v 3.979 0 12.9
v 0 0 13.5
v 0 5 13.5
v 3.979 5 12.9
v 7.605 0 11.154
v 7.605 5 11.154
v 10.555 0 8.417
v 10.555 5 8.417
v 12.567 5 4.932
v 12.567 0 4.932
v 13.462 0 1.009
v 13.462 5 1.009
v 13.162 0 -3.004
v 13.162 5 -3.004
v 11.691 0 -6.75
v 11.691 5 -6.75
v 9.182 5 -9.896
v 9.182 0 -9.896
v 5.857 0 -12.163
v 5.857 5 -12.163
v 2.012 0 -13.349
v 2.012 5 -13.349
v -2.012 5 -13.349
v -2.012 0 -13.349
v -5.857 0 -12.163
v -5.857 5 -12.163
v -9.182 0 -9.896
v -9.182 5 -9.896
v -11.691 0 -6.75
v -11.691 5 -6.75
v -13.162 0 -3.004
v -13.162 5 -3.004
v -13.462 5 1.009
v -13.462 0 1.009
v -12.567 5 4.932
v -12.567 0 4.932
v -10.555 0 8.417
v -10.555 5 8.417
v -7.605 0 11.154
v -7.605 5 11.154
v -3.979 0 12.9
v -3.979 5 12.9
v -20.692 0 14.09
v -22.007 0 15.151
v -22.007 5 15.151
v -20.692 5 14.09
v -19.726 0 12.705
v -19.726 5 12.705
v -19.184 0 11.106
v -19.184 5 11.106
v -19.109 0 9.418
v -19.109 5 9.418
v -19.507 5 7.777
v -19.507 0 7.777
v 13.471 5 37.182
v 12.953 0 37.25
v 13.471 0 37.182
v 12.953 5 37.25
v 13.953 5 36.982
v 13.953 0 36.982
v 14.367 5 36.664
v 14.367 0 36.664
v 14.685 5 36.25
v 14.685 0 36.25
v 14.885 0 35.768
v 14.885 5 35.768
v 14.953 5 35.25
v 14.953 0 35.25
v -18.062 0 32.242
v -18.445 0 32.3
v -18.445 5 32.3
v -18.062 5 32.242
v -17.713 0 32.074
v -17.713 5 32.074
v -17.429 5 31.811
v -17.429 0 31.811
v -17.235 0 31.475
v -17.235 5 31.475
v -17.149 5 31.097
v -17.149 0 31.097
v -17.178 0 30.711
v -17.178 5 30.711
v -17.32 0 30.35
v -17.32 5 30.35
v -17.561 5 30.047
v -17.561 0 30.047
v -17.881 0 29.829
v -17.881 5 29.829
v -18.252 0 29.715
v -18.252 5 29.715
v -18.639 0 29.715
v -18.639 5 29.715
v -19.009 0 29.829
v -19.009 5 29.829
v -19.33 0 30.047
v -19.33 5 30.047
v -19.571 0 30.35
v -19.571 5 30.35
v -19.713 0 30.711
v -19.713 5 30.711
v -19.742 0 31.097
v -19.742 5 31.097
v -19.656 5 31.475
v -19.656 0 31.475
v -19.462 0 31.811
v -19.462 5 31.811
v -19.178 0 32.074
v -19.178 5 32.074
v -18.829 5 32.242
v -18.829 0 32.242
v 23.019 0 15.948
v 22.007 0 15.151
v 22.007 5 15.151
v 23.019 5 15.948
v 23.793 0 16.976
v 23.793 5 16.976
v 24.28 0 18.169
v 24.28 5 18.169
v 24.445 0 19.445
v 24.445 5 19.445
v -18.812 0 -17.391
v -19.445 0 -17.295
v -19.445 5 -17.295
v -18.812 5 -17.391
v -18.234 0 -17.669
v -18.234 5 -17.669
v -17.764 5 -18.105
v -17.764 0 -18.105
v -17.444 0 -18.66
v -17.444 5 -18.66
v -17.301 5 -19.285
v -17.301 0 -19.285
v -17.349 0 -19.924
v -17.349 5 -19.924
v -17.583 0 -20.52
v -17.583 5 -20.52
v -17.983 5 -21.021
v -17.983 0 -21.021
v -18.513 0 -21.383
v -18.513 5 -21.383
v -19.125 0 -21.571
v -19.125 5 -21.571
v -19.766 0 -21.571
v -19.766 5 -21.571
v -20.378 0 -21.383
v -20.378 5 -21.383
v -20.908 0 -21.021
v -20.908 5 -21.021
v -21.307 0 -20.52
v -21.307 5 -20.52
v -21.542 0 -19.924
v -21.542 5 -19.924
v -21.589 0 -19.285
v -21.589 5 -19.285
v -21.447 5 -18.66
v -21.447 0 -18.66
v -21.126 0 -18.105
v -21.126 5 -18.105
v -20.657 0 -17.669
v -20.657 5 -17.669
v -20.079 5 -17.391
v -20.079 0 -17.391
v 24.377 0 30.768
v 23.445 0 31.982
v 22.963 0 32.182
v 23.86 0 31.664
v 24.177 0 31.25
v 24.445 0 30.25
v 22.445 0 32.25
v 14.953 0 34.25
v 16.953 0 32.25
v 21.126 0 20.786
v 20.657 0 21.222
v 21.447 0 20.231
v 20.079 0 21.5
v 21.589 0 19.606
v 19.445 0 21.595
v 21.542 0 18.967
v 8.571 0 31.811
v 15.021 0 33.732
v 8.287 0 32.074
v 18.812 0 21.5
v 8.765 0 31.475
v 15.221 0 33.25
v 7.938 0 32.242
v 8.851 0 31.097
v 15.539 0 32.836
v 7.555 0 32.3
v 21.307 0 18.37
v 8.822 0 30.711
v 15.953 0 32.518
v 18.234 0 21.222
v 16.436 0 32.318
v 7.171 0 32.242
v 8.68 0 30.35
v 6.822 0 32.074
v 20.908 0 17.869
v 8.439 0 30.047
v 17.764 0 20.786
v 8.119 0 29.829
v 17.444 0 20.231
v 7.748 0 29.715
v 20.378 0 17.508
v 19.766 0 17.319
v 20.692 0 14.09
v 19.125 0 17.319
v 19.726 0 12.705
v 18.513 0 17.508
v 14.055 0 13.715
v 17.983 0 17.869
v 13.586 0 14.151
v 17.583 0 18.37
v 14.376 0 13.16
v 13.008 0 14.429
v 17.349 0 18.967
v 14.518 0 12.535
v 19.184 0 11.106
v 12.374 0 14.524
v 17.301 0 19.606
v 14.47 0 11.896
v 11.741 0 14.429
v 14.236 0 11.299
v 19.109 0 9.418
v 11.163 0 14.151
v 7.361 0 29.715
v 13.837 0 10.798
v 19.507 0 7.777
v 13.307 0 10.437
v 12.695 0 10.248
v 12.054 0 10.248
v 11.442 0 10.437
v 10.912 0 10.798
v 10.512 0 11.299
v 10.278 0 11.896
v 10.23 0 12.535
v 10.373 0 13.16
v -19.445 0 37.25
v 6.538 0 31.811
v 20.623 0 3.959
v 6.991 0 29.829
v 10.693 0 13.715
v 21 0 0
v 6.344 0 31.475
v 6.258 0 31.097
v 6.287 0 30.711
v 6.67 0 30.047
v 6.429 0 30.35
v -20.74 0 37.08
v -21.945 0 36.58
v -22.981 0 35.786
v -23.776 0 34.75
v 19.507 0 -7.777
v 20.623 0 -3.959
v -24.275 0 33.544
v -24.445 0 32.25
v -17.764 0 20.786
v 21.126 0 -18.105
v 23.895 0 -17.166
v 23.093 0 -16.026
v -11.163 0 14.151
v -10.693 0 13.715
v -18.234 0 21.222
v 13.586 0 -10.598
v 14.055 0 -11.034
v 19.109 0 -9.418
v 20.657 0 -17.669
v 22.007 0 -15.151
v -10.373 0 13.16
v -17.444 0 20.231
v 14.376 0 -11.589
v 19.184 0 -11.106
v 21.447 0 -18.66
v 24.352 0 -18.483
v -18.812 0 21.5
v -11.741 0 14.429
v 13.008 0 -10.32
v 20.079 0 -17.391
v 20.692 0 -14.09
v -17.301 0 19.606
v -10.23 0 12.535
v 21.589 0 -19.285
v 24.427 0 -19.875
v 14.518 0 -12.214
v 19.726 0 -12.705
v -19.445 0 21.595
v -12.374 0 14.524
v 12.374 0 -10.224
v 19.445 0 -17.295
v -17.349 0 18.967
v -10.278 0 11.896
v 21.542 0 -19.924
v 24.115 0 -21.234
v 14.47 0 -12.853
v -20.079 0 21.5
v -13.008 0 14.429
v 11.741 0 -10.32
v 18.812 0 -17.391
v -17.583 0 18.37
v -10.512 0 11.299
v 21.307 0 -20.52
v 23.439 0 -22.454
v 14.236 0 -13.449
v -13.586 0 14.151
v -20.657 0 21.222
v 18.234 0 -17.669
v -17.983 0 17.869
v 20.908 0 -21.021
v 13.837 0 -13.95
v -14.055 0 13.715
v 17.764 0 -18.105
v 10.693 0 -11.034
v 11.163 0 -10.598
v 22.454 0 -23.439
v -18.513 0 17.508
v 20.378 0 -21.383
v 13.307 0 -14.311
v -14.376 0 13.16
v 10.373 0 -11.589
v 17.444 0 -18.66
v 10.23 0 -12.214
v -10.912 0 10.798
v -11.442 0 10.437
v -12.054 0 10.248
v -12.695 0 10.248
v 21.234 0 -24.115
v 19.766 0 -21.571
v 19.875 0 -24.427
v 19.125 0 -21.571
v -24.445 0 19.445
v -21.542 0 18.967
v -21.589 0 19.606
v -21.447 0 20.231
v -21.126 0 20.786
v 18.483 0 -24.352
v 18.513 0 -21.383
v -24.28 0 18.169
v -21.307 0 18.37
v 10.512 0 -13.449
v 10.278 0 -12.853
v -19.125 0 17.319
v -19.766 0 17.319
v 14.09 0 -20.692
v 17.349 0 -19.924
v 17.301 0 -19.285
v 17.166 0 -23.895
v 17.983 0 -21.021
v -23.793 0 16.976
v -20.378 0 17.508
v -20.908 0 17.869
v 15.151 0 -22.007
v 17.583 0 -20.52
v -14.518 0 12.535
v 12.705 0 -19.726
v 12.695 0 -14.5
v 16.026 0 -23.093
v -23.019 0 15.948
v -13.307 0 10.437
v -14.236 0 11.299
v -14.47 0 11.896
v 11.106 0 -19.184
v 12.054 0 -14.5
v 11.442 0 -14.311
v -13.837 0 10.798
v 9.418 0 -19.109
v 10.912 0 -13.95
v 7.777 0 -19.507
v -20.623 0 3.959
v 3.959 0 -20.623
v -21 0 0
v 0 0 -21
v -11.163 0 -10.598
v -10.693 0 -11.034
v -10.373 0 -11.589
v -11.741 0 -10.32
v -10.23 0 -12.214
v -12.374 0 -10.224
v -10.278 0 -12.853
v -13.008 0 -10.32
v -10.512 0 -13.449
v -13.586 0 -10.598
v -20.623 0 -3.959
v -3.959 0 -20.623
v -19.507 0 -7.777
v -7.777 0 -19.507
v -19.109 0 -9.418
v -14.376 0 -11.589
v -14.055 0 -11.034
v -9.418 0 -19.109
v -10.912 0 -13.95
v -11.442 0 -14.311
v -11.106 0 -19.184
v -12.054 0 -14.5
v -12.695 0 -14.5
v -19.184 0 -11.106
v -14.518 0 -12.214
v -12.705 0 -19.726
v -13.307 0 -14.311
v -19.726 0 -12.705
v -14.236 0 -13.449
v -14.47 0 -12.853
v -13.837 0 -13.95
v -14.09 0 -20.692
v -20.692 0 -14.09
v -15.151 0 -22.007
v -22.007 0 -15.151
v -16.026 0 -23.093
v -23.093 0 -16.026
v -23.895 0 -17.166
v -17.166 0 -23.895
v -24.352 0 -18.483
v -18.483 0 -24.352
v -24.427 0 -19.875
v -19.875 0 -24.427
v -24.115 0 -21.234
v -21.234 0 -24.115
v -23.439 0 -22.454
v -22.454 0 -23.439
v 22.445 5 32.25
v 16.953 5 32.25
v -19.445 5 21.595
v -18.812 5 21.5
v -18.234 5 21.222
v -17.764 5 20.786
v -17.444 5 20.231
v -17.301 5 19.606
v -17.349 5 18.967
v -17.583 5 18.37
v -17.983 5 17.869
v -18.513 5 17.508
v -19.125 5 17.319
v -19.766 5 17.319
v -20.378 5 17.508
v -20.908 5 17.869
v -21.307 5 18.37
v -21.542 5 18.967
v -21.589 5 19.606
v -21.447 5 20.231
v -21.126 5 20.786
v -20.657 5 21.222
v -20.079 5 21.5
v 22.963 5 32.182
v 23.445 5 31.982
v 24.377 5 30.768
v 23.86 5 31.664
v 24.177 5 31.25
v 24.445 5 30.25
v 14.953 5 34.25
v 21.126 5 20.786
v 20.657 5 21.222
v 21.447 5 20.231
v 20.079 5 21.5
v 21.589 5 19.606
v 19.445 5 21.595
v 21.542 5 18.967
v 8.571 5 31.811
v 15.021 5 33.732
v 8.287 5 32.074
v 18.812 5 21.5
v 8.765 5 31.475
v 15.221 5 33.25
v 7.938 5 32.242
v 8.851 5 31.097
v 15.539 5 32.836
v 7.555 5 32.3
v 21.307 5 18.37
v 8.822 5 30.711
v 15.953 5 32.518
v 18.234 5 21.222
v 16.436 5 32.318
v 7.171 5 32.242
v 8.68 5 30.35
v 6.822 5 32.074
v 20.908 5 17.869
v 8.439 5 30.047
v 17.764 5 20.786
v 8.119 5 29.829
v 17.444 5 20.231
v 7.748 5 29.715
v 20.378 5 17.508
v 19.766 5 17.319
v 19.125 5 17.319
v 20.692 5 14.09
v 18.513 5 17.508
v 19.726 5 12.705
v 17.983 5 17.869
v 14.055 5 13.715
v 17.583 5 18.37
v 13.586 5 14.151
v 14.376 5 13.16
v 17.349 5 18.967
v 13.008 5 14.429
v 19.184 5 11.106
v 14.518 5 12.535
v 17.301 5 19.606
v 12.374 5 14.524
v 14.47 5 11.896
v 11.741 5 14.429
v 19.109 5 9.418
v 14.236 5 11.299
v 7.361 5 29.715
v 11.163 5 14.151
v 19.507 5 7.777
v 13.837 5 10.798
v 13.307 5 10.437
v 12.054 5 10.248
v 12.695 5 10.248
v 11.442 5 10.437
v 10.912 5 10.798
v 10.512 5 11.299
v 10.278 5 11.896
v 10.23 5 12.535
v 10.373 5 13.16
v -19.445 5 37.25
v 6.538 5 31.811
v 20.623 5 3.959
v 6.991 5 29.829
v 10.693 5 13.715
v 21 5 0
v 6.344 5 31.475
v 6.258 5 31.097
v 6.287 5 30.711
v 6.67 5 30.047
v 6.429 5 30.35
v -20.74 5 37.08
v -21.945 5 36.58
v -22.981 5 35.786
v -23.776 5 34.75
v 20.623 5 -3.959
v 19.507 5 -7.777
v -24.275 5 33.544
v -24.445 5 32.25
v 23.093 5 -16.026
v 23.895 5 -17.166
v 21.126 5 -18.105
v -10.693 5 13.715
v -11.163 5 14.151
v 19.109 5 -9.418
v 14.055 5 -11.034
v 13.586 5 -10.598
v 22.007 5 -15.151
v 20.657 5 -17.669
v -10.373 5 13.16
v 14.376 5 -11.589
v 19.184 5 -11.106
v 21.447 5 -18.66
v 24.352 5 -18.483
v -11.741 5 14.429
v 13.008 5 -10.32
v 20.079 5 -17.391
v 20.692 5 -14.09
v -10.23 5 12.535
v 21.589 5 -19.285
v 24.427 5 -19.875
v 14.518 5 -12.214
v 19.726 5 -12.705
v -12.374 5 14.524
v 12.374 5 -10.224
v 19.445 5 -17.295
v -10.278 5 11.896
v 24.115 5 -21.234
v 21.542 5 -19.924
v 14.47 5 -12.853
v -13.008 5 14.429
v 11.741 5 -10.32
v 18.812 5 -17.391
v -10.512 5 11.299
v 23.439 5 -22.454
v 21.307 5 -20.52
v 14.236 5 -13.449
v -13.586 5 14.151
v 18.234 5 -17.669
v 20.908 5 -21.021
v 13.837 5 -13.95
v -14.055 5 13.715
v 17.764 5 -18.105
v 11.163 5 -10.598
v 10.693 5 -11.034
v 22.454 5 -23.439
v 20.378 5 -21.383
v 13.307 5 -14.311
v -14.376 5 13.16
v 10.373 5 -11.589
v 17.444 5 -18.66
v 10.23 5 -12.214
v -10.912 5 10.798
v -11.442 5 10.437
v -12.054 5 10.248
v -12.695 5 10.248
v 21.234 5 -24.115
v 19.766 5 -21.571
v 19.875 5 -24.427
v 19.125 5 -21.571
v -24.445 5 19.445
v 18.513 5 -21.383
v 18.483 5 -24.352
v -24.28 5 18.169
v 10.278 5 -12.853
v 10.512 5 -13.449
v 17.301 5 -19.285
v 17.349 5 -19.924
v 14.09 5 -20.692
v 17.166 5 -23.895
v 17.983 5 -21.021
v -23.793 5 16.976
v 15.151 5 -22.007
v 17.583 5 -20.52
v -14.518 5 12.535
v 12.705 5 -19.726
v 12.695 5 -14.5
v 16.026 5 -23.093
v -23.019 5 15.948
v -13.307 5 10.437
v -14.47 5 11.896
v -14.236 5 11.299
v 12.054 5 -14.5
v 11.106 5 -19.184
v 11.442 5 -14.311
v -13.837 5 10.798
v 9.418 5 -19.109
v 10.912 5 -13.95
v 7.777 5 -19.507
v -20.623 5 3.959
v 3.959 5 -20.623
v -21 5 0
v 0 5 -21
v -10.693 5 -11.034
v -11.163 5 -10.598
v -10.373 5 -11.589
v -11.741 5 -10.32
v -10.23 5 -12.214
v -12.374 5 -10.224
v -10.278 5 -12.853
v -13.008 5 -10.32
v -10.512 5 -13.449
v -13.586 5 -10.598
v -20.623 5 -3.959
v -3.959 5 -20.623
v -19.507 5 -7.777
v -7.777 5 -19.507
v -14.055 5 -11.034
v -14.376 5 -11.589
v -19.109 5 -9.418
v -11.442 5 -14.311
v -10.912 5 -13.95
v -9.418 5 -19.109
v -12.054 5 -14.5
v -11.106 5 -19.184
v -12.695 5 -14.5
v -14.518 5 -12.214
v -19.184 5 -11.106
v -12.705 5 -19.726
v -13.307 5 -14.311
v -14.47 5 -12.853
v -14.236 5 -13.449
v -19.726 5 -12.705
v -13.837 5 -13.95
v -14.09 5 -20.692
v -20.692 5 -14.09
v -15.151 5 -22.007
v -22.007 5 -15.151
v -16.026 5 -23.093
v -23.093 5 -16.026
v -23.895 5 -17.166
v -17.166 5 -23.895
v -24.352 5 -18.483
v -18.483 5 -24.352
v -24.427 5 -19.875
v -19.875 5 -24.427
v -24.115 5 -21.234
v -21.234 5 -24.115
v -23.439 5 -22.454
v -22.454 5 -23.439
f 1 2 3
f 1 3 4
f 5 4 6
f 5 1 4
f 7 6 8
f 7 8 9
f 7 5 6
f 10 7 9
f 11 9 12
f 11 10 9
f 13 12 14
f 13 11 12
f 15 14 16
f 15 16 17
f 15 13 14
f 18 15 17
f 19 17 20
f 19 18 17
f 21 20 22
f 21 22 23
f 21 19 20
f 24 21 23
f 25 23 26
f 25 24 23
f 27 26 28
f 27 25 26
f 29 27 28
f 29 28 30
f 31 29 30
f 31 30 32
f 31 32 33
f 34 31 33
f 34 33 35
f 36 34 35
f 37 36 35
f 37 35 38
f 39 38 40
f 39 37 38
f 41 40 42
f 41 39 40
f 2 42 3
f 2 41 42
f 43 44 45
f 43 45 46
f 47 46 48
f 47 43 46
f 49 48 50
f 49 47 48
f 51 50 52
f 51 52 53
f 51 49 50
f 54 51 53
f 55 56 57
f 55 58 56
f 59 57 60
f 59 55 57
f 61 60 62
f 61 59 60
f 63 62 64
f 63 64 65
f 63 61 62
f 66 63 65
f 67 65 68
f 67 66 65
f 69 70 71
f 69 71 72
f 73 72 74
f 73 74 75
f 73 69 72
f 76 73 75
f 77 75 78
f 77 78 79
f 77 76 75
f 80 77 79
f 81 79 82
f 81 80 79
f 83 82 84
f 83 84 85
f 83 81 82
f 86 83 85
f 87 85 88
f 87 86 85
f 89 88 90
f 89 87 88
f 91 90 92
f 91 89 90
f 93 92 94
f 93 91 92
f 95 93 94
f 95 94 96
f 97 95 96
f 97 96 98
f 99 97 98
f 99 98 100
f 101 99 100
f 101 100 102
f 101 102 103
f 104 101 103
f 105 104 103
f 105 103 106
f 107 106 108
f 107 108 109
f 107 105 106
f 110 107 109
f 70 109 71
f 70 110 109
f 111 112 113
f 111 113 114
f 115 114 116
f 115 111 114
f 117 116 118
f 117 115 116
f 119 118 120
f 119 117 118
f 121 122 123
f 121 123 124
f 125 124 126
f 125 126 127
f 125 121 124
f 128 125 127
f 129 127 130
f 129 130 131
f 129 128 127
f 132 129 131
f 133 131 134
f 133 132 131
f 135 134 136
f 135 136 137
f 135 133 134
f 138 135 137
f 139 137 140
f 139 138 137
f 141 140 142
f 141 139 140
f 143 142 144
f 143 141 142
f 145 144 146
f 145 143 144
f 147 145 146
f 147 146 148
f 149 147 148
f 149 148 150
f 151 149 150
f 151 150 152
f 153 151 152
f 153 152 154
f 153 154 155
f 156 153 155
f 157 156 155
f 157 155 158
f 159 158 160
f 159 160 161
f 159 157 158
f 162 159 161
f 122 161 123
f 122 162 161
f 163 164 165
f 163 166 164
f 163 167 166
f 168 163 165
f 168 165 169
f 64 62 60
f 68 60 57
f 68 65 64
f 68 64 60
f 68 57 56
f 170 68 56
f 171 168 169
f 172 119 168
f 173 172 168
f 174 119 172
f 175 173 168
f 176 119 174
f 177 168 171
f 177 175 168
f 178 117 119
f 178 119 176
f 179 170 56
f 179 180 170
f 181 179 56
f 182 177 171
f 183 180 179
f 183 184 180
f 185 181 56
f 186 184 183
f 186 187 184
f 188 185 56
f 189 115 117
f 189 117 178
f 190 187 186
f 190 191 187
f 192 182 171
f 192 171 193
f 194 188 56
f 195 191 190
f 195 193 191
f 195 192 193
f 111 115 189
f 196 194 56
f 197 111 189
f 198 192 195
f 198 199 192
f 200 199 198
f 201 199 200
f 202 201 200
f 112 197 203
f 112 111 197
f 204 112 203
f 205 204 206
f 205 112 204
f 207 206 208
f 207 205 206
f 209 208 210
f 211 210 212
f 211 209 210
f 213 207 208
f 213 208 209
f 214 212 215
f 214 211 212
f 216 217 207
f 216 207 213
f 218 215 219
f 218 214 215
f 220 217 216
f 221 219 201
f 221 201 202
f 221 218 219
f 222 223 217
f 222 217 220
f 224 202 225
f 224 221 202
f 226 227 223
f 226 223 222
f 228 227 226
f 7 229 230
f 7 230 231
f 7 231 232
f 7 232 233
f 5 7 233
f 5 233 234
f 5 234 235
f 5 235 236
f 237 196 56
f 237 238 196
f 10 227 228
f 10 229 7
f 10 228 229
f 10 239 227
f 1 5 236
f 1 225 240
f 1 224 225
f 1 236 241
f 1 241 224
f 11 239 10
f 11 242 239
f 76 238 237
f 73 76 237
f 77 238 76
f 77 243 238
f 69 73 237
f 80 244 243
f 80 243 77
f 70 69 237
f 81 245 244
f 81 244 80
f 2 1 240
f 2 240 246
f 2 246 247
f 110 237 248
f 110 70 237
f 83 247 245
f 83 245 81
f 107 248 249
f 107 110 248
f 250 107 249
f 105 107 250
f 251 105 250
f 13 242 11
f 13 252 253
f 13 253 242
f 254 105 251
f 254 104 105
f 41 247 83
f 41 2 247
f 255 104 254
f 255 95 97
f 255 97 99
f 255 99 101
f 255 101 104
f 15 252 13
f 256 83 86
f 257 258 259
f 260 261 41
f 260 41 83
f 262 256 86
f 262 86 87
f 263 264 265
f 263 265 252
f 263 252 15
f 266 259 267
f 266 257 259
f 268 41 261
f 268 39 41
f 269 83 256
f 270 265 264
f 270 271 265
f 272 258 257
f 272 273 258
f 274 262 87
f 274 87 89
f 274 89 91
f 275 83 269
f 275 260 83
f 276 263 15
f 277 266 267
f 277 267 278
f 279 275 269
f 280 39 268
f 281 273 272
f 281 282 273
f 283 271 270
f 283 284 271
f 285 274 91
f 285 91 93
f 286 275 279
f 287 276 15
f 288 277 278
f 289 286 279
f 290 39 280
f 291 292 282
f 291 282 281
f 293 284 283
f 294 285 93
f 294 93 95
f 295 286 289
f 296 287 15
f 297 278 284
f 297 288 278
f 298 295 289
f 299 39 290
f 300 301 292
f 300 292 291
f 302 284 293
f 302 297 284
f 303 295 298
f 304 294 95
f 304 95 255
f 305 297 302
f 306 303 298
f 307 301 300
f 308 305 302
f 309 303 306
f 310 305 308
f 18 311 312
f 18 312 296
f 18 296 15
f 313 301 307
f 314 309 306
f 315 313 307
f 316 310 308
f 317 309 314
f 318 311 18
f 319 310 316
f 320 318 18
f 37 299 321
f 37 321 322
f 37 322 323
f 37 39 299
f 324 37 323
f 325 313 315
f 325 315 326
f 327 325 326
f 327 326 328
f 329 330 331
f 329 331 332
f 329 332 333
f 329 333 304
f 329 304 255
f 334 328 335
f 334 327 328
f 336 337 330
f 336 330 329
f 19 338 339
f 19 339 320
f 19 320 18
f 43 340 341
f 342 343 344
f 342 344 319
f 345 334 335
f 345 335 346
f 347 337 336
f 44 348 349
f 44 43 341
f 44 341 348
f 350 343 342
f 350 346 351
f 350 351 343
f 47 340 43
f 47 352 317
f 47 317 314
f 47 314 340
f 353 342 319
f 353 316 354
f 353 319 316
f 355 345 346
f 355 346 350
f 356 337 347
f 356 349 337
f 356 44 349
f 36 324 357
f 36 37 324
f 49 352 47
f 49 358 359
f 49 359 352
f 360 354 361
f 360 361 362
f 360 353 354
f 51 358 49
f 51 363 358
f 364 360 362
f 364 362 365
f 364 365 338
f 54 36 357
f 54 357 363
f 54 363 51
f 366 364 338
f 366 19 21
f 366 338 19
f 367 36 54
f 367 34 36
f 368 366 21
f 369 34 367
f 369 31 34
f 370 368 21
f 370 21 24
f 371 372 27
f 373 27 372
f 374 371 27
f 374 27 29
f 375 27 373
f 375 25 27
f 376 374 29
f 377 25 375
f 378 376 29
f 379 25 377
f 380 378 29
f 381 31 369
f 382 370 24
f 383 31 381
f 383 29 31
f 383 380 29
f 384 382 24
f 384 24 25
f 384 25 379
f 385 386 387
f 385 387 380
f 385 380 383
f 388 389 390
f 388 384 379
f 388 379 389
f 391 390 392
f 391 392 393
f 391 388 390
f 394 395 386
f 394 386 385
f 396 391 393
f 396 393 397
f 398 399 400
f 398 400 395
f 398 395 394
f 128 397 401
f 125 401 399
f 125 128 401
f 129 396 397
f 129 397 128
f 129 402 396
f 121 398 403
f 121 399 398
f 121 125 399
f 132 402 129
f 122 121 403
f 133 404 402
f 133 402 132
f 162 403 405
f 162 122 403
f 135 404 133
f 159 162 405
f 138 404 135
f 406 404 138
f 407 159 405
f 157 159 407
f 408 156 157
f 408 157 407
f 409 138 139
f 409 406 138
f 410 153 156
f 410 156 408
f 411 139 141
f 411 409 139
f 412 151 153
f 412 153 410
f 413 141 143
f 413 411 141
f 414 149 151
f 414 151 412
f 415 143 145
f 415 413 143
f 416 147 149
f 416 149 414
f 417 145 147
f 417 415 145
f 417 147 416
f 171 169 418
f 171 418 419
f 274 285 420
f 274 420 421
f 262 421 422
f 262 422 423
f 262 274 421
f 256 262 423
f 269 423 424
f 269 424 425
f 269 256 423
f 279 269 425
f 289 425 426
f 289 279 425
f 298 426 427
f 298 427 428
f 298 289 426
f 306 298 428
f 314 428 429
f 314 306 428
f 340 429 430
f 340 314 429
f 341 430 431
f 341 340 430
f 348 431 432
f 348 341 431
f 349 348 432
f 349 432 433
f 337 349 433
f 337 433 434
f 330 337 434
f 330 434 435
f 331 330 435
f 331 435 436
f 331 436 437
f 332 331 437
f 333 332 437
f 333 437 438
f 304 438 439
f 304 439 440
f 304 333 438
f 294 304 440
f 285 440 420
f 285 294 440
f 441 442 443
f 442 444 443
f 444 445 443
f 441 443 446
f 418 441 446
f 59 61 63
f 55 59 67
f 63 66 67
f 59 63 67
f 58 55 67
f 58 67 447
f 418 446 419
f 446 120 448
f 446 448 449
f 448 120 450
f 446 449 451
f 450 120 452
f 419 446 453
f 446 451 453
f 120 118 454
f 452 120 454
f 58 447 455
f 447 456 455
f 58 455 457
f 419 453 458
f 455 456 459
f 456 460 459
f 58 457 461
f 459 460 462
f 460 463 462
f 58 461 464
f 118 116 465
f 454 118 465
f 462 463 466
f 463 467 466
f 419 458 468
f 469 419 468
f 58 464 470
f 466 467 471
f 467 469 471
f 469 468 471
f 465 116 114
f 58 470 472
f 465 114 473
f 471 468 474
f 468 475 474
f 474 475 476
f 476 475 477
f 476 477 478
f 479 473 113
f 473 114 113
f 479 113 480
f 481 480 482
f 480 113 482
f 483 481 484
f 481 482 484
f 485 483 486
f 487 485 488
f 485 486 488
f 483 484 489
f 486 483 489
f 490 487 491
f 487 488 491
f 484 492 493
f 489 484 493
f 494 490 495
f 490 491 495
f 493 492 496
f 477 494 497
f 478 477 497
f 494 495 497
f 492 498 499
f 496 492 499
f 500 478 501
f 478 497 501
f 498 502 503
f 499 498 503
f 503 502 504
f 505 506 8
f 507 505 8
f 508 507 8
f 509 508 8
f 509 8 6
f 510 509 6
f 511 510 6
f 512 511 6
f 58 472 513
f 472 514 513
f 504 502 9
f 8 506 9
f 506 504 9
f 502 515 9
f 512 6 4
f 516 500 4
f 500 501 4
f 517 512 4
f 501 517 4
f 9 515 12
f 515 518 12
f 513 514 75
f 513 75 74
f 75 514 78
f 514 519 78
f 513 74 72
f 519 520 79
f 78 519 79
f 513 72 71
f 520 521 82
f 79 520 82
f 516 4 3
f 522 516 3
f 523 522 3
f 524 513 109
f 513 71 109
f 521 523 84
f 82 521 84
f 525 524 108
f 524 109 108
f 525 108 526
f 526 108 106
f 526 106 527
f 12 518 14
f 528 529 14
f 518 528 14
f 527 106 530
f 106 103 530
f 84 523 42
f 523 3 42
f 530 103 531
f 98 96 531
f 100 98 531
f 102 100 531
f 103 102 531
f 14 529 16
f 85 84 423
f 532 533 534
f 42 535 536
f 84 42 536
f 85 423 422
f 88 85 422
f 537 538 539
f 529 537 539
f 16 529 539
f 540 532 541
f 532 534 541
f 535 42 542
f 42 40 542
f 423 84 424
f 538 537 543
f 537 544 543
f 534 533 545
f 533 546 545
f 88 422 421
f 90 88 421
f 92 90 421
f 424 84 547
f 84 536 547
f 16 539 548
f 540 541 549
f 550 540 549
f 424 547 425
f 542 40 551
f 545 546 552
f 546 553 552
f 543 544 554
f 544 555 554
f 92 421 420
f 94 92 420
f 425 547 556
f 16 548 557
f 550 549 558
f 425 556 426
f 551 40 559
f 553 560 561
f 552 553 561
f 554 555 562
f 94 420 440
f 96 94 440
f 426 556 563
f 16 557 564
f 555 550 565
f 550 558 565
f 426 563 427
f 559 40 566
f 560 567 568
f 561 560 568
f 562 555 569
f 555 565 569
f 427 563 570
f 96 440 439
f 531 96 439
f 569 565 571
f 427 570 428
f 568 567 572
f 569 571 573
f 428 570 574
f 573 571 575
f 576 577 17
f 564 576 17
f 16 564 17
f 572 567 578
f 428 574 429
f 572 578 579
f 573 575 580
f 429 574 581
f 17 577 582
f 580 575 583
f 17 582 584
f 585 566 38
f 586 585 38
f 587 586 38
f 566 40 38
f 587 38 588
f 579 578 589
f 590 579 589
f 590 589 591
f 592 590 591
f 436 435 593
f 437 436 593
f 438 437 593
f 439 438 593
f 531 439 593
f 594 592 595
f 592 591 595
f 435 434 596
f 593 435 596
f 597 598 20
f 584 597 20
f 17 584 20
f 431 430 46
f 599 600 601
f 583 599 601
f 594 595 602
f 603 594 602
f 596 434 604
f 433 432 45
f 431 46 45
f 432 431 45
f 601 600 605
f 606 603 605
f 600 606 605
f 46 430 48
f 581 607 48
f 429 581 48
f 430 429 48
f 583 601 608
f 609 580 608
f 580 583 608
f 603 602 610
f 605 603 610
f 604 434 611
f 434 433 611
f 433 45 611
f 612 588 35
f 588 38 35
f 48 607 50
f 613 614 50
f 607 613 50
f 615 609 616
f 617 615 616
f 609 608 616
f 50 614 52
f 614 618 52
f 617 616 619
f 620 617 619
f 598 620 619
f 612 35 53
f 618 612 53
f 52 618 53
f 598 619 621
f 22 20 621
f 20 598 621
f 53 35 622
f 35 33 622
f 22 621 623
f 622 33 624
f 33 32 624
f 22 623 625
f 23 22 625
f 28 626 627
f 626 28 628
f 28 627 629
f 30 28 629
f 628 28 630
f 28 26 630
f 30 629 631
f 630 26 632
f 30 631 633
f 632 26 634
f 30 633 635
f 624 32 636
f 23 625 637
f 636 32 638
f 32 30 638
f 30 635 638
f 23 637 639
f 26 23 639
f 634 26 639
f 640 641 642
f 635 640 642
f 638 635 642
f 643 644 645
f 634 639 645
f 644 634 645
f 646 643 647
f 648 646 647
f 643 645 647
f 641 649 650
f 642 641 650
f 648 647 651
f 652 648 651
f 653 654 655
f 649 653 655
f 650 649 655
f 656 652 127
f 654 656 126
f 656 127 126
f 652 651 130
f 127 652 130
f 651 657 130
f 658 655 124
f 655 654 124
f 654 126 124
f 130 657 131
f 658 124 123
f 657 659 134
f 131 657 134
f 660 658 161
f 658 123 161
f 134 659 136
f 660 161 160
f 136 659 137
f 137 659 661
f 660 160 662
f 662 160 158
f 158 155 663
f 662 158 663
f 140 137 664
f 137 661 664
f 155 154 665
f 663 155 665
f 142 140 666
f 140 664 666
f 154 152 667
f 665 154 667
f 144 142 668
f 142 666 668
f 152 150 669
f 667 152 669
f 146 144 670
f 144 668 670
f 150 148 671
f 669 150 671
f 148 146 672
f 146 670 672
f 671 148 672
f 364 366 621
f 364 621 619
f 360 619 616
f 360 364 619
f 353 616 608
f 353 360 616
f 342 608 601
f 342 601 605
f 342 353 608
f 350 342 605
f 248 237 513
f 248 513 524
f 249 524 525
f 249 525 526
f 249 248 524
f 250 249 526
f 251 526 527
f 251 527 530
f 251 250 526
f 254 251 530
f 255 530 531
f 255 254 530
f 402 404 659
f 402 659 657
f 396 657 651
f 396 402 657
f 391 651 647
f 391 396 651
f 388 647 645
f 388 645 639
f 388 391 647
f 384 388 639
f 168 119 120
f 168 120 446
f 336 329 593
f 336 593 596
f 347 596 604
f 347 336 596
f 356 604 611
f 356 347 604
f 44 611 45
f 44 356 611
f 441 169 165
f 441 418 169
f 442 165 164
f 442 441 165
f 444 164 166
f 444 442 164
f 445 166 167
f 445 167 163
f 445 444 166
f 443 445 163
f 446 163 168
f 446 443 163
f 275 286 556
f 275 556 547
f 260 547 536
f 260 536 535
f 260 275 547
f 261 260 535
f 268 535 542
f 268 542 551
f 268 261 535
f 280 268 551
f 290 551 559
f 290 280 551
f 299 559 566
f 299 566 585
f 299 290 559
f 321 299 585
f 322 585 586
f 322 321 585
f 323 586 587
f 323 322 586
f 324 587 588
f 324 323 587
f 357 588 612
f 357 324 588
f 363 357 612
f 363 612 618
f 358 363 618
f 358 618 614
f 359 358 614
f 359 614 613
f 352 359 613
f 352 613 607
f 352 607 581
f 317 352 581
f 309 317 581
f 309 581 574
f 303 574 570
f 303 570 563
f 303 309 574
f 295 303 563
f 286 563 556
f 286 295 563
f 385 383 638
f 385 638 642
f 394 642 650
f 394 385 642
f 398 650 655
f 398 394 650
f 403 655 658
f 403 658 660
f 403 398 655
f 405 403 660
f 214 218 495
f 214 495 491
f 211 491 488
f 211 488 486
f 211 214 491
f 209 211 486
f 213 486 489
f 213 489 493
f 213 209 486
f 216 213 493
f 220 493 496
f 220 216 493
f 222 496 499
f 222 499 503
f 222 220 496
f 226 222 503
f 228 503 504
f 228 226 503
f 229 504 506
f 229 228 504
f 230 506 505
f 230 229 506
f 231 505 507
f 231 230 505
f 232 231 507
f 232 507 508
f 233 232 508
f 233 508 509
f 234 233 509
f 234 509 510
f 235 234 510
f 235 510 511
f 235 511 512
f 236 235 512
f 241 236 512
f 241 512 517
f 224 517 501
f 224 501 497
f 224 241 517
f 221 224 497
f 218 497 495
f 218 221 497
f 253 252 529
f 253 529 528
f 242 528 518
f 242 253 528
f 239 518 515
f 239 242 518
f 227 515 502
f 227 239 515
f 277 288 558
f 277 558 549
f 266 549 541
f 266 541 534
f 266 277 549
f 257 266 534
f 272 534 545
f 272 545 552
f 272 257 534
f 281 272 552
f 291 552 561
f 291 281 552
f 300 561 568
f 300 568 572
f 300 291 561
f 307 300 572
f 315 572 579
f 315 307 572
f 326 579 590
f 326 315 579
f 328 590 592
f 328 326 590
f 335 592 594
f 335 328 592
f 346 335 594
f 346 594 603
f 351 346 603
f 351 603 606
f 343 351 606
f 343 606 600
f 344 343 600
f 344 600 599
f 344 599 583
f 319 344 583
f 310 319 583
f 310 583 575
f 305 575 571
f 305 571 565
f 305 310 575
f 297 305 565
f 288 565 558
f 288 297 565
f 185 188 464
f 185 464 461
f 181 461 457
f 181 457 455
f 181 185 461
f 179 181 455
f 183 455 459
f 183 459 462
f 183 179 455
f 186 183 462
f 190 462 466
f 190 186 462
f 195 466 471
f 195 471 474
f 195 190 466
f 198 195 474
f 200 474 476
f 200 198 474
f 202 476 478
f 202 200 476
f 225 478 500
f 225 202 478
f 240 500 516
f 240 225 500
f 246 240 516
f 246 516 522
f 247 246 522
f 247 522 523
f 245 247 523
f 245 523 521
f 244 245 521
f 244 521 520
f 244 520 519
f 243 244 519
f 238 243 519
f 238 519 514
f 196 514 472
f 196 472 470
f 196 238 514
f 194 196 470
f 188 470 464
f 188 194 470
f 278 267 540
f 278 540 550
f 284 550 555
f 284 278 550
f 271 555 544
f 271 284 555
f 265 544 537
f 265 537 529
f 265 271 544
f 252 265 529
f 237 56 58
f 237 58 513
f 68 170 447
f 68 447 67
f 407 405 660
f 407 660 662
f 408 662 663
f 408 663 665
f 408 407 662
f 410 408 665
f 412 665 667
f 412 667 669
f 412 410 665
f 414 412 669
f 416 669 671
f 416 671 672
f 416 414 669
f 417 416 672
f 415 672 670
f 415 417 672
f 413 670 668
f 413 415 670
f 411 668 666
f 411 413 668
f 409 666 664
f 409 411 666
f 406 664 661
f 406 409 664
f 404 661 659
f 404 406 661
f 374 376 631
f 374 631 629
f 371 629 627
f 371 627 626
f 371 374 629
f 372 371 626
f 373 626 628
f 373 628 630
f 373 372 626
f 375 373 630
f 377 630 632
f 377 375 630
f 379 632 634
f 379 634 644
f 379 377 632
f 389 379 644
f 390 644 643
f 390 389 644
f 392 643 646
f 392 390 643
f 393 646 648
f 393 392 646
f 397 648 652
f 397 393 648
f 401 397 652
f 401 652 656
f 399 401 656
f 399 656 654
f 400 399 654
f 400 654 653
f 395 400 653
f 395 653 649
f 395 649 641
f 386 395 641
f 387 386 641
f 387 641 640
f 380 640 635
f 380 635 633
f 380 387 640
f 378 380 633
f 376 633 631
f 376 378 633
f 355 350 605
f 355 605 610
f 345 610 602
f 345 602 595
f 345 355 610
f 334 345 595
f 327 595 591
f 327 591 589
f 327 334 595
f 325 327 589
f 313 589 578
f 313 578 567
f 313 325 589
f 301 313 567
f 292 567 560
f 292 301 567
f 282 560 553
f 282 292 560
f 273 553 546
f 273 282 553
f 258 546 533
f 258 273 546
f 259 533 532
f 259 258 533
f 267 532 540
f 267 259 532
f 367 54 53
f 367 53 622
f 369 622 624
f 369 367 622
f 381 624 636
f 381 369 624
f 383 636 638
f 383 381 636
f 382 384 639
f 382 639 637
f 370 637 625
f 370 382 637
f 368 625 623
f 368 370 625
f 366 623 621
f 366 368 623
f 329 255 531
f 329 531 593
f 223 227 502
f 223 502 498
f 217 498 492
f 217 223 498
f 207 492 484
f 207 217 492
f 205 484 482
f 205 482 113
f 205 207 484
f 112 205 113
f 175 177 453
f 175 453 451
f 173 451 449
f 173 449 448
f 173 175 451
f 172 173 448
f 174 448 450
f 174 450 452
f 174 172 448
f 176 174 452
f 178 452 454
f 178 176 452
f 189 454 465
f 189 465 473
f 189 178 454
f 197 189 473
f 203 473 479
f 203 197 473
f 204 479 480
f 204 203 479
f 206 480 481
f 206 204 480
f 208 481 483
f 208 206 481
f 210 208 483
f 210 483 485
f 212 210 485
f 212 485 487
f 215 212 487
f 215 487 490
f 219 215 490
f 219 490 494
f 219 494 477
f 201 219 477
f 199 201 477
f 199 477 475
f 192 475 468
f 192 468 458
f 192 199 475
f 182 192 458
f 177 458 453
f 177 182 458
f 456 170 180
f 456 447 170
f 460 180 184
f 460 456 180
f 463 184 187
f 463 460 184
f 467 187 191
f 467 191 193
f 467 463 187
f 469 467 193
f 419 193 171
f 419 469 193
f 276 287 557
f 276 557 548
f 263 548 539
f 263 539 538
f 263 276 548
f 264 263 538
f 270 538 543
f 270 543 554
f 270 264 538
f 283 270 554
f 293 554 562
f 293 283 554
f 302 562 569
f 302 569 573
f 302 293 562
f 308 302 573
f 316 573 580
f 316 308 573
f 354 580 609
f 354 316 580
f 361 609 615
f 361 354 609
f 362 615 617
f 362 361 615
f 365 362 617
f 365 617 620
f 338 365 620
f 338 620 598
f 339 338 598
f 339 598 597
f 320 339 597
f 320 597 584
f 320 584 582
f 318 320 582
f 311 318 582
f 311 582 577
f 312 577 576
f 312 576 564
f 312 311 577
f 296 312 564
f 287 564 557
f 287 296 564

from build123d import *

# Parameters (mm, degrees)
SKETCH_1_R      = 13.5
SKETCH_1_R_2    = 2.15
SKETCH_1_R_3    = 1.3
EXTRUDE_1_DEPTH = 5
FILLET_1_R      = 2


with BuildPart() as part:
    # ｽｹｯﾁ1 → ﾎﾞｽ - 押し出し1 (new body)
    with BuildSketch(Plane(origin=(0, 0, 0), x_dir=(1, 0, 0), z_dir=(0, 1, 0))):
        with BuildLine():
            Line((-24.445436483, -32.25), (-24.445436483, -19.445436483))
            ThreePointArc((-24.445436483, -19.445436483), (-23.793249982, -16.976323733), (-22.006829374, -15.151339784))
            ThreePointArc((-22.006829374, -15.151339784), (-19.398069264, -11.924552334), (-19.507056212, -7.776551803))
            ThreePointArc((-19.507056212, -7.776551803), (-21, 0), (-19.507056212, 7.776551803))
            ThreePointArc((-19.507056212, 7.776551803), (-19.398069264, 11.924552334), (-22.006829374, 15.151339784))
            ThreePointArc((-22.006829374, 15.151339784), (-22.980970389, 22.980970389), (-15.151339784, 22.006829374))
            ThreePointArc((-15.151339784, 22.006829374), (-11.924552334, 19.398069264), (-7.776551803, 19.507056212))
            ThreePointArc((-7.776551803, 19.507056212), (0, 21), (7.776551803, 19.507056212))
            ThreePointArc((7.776551803, 19.507056212), (11.924552334, 19.398069264), (15.151339784, 22.006829374))
            ThreePointArc((15.151339784, 22.006829374), (22.980970389, 22.980970389), (22.006829374, 15.151339784))
            ThreePointArc((22.006829374, 15.151339784), (19.398069264, 11.924552334), (19.507056212, 7.776551803))
            ThreePointArc((19.507056212, 7.776551803), (21, 0), (19.507056212, -7.776551803))
            ThreePointArc((19.507056212, -7.776551803), (19.398069264, -11.924552334), (22.006829374, -15.151339784))
            ThreePointArc((22.006829374, -15.151339784), (23.793249982, -16.976323733), (24.445436483, -19.445436483))
            Line((24.445436483, -19.445436483), (24.445436483, -32.25))
            Line((24.445436483, -32.25), (14.953214466, -32.25))
            Line((14.953214466, -32.25), (14.953214466, -37.25))
            Line((14.953214466, -37.25), (-19.445436483, -37.25))
            ThreePointArc((-19.445436483, -37.25), (-22.980970389, -35.785533906), (-24.445436483, -32.25))
        make_face()
        with Locations(Location((0, 0, 0), (0, 0, 270))):
            Circle(SKETCH_1_R, mode=Mode.SUBTRACT)
        with Locations(Location((12.374368671, 12.374368671, 0), (0, 0, 270))):
            Circle(SKETCH_1_R_2, mode=Mode.SUBTRACT)
        with Locations(Location((12.374368671, -12.374368671, 0), (0, 0, 270))):
            Circle(SKETCH_1_R_2, mode=Mode.SUBTRACT)
        with Locations(Location((-12.374368671, -12.374368671, 0), (0, 0, 270))):
            Circle(SKETCH_1_R_2, mode=Mode.SUBTRACT)
        with Locations(Location((-12.374368671, 12.374368671, 0), (0, 0, 270))):
            Circle(SKETCH_1_R_2, mode=Mode.SUBTRACT)
        with Locations(Location((19.445436483, 19.445436483, 0), (0, 0, 270))):
            Circle(SKETCH_1_R_2, mode=Mode.SUBTRACT)
        with Locations(Location((19.445436483, -19.445436483, 0), (0, 0, 270))):
            Circle(SKETCH_1_R_2, mode=Mode.SUBTRACT)
        with Locations(Location((-19.445436483, -19.445436483, 0), (0, 0, 270))):
            Circle(SKETCH_1_R_2, mode=Mode.SUBTRACT)
        with Locations(Location((-19.445436483, 19.445436483, 0), (0, 0, 270))):
            Circle(SKETCH_1_R_2, mode=Mode.SUBTRACT)
        with Locations(Location((7.554563517, -31, 0), (0, 0, 270))):
            Circle(SKETCH_1_R_3, mode=Mode.SUBTRACT)
        with Locations(Location((-18.445436483, -31, 0), (0, 0, 270))):
            Circle(SKETCH_1_R_3, mode=Mode.SUBTRACT)
    extrude(amount=EXTRUDE_1_DEPTH)

    # ﾌｨﾚｯﾄ1
    fillet_1_edges = [part.edges().sort_by_distance(p)[0] for p in [
        (24.445436483, 2.5, 32.25),
        (14.953214466, 2.5, 32.25),
        (14.953214466, 2.5, 37.25),
    ]]
    fillet(fillet_1_edges, radius=FILLET_1_R)


solid = part.part
